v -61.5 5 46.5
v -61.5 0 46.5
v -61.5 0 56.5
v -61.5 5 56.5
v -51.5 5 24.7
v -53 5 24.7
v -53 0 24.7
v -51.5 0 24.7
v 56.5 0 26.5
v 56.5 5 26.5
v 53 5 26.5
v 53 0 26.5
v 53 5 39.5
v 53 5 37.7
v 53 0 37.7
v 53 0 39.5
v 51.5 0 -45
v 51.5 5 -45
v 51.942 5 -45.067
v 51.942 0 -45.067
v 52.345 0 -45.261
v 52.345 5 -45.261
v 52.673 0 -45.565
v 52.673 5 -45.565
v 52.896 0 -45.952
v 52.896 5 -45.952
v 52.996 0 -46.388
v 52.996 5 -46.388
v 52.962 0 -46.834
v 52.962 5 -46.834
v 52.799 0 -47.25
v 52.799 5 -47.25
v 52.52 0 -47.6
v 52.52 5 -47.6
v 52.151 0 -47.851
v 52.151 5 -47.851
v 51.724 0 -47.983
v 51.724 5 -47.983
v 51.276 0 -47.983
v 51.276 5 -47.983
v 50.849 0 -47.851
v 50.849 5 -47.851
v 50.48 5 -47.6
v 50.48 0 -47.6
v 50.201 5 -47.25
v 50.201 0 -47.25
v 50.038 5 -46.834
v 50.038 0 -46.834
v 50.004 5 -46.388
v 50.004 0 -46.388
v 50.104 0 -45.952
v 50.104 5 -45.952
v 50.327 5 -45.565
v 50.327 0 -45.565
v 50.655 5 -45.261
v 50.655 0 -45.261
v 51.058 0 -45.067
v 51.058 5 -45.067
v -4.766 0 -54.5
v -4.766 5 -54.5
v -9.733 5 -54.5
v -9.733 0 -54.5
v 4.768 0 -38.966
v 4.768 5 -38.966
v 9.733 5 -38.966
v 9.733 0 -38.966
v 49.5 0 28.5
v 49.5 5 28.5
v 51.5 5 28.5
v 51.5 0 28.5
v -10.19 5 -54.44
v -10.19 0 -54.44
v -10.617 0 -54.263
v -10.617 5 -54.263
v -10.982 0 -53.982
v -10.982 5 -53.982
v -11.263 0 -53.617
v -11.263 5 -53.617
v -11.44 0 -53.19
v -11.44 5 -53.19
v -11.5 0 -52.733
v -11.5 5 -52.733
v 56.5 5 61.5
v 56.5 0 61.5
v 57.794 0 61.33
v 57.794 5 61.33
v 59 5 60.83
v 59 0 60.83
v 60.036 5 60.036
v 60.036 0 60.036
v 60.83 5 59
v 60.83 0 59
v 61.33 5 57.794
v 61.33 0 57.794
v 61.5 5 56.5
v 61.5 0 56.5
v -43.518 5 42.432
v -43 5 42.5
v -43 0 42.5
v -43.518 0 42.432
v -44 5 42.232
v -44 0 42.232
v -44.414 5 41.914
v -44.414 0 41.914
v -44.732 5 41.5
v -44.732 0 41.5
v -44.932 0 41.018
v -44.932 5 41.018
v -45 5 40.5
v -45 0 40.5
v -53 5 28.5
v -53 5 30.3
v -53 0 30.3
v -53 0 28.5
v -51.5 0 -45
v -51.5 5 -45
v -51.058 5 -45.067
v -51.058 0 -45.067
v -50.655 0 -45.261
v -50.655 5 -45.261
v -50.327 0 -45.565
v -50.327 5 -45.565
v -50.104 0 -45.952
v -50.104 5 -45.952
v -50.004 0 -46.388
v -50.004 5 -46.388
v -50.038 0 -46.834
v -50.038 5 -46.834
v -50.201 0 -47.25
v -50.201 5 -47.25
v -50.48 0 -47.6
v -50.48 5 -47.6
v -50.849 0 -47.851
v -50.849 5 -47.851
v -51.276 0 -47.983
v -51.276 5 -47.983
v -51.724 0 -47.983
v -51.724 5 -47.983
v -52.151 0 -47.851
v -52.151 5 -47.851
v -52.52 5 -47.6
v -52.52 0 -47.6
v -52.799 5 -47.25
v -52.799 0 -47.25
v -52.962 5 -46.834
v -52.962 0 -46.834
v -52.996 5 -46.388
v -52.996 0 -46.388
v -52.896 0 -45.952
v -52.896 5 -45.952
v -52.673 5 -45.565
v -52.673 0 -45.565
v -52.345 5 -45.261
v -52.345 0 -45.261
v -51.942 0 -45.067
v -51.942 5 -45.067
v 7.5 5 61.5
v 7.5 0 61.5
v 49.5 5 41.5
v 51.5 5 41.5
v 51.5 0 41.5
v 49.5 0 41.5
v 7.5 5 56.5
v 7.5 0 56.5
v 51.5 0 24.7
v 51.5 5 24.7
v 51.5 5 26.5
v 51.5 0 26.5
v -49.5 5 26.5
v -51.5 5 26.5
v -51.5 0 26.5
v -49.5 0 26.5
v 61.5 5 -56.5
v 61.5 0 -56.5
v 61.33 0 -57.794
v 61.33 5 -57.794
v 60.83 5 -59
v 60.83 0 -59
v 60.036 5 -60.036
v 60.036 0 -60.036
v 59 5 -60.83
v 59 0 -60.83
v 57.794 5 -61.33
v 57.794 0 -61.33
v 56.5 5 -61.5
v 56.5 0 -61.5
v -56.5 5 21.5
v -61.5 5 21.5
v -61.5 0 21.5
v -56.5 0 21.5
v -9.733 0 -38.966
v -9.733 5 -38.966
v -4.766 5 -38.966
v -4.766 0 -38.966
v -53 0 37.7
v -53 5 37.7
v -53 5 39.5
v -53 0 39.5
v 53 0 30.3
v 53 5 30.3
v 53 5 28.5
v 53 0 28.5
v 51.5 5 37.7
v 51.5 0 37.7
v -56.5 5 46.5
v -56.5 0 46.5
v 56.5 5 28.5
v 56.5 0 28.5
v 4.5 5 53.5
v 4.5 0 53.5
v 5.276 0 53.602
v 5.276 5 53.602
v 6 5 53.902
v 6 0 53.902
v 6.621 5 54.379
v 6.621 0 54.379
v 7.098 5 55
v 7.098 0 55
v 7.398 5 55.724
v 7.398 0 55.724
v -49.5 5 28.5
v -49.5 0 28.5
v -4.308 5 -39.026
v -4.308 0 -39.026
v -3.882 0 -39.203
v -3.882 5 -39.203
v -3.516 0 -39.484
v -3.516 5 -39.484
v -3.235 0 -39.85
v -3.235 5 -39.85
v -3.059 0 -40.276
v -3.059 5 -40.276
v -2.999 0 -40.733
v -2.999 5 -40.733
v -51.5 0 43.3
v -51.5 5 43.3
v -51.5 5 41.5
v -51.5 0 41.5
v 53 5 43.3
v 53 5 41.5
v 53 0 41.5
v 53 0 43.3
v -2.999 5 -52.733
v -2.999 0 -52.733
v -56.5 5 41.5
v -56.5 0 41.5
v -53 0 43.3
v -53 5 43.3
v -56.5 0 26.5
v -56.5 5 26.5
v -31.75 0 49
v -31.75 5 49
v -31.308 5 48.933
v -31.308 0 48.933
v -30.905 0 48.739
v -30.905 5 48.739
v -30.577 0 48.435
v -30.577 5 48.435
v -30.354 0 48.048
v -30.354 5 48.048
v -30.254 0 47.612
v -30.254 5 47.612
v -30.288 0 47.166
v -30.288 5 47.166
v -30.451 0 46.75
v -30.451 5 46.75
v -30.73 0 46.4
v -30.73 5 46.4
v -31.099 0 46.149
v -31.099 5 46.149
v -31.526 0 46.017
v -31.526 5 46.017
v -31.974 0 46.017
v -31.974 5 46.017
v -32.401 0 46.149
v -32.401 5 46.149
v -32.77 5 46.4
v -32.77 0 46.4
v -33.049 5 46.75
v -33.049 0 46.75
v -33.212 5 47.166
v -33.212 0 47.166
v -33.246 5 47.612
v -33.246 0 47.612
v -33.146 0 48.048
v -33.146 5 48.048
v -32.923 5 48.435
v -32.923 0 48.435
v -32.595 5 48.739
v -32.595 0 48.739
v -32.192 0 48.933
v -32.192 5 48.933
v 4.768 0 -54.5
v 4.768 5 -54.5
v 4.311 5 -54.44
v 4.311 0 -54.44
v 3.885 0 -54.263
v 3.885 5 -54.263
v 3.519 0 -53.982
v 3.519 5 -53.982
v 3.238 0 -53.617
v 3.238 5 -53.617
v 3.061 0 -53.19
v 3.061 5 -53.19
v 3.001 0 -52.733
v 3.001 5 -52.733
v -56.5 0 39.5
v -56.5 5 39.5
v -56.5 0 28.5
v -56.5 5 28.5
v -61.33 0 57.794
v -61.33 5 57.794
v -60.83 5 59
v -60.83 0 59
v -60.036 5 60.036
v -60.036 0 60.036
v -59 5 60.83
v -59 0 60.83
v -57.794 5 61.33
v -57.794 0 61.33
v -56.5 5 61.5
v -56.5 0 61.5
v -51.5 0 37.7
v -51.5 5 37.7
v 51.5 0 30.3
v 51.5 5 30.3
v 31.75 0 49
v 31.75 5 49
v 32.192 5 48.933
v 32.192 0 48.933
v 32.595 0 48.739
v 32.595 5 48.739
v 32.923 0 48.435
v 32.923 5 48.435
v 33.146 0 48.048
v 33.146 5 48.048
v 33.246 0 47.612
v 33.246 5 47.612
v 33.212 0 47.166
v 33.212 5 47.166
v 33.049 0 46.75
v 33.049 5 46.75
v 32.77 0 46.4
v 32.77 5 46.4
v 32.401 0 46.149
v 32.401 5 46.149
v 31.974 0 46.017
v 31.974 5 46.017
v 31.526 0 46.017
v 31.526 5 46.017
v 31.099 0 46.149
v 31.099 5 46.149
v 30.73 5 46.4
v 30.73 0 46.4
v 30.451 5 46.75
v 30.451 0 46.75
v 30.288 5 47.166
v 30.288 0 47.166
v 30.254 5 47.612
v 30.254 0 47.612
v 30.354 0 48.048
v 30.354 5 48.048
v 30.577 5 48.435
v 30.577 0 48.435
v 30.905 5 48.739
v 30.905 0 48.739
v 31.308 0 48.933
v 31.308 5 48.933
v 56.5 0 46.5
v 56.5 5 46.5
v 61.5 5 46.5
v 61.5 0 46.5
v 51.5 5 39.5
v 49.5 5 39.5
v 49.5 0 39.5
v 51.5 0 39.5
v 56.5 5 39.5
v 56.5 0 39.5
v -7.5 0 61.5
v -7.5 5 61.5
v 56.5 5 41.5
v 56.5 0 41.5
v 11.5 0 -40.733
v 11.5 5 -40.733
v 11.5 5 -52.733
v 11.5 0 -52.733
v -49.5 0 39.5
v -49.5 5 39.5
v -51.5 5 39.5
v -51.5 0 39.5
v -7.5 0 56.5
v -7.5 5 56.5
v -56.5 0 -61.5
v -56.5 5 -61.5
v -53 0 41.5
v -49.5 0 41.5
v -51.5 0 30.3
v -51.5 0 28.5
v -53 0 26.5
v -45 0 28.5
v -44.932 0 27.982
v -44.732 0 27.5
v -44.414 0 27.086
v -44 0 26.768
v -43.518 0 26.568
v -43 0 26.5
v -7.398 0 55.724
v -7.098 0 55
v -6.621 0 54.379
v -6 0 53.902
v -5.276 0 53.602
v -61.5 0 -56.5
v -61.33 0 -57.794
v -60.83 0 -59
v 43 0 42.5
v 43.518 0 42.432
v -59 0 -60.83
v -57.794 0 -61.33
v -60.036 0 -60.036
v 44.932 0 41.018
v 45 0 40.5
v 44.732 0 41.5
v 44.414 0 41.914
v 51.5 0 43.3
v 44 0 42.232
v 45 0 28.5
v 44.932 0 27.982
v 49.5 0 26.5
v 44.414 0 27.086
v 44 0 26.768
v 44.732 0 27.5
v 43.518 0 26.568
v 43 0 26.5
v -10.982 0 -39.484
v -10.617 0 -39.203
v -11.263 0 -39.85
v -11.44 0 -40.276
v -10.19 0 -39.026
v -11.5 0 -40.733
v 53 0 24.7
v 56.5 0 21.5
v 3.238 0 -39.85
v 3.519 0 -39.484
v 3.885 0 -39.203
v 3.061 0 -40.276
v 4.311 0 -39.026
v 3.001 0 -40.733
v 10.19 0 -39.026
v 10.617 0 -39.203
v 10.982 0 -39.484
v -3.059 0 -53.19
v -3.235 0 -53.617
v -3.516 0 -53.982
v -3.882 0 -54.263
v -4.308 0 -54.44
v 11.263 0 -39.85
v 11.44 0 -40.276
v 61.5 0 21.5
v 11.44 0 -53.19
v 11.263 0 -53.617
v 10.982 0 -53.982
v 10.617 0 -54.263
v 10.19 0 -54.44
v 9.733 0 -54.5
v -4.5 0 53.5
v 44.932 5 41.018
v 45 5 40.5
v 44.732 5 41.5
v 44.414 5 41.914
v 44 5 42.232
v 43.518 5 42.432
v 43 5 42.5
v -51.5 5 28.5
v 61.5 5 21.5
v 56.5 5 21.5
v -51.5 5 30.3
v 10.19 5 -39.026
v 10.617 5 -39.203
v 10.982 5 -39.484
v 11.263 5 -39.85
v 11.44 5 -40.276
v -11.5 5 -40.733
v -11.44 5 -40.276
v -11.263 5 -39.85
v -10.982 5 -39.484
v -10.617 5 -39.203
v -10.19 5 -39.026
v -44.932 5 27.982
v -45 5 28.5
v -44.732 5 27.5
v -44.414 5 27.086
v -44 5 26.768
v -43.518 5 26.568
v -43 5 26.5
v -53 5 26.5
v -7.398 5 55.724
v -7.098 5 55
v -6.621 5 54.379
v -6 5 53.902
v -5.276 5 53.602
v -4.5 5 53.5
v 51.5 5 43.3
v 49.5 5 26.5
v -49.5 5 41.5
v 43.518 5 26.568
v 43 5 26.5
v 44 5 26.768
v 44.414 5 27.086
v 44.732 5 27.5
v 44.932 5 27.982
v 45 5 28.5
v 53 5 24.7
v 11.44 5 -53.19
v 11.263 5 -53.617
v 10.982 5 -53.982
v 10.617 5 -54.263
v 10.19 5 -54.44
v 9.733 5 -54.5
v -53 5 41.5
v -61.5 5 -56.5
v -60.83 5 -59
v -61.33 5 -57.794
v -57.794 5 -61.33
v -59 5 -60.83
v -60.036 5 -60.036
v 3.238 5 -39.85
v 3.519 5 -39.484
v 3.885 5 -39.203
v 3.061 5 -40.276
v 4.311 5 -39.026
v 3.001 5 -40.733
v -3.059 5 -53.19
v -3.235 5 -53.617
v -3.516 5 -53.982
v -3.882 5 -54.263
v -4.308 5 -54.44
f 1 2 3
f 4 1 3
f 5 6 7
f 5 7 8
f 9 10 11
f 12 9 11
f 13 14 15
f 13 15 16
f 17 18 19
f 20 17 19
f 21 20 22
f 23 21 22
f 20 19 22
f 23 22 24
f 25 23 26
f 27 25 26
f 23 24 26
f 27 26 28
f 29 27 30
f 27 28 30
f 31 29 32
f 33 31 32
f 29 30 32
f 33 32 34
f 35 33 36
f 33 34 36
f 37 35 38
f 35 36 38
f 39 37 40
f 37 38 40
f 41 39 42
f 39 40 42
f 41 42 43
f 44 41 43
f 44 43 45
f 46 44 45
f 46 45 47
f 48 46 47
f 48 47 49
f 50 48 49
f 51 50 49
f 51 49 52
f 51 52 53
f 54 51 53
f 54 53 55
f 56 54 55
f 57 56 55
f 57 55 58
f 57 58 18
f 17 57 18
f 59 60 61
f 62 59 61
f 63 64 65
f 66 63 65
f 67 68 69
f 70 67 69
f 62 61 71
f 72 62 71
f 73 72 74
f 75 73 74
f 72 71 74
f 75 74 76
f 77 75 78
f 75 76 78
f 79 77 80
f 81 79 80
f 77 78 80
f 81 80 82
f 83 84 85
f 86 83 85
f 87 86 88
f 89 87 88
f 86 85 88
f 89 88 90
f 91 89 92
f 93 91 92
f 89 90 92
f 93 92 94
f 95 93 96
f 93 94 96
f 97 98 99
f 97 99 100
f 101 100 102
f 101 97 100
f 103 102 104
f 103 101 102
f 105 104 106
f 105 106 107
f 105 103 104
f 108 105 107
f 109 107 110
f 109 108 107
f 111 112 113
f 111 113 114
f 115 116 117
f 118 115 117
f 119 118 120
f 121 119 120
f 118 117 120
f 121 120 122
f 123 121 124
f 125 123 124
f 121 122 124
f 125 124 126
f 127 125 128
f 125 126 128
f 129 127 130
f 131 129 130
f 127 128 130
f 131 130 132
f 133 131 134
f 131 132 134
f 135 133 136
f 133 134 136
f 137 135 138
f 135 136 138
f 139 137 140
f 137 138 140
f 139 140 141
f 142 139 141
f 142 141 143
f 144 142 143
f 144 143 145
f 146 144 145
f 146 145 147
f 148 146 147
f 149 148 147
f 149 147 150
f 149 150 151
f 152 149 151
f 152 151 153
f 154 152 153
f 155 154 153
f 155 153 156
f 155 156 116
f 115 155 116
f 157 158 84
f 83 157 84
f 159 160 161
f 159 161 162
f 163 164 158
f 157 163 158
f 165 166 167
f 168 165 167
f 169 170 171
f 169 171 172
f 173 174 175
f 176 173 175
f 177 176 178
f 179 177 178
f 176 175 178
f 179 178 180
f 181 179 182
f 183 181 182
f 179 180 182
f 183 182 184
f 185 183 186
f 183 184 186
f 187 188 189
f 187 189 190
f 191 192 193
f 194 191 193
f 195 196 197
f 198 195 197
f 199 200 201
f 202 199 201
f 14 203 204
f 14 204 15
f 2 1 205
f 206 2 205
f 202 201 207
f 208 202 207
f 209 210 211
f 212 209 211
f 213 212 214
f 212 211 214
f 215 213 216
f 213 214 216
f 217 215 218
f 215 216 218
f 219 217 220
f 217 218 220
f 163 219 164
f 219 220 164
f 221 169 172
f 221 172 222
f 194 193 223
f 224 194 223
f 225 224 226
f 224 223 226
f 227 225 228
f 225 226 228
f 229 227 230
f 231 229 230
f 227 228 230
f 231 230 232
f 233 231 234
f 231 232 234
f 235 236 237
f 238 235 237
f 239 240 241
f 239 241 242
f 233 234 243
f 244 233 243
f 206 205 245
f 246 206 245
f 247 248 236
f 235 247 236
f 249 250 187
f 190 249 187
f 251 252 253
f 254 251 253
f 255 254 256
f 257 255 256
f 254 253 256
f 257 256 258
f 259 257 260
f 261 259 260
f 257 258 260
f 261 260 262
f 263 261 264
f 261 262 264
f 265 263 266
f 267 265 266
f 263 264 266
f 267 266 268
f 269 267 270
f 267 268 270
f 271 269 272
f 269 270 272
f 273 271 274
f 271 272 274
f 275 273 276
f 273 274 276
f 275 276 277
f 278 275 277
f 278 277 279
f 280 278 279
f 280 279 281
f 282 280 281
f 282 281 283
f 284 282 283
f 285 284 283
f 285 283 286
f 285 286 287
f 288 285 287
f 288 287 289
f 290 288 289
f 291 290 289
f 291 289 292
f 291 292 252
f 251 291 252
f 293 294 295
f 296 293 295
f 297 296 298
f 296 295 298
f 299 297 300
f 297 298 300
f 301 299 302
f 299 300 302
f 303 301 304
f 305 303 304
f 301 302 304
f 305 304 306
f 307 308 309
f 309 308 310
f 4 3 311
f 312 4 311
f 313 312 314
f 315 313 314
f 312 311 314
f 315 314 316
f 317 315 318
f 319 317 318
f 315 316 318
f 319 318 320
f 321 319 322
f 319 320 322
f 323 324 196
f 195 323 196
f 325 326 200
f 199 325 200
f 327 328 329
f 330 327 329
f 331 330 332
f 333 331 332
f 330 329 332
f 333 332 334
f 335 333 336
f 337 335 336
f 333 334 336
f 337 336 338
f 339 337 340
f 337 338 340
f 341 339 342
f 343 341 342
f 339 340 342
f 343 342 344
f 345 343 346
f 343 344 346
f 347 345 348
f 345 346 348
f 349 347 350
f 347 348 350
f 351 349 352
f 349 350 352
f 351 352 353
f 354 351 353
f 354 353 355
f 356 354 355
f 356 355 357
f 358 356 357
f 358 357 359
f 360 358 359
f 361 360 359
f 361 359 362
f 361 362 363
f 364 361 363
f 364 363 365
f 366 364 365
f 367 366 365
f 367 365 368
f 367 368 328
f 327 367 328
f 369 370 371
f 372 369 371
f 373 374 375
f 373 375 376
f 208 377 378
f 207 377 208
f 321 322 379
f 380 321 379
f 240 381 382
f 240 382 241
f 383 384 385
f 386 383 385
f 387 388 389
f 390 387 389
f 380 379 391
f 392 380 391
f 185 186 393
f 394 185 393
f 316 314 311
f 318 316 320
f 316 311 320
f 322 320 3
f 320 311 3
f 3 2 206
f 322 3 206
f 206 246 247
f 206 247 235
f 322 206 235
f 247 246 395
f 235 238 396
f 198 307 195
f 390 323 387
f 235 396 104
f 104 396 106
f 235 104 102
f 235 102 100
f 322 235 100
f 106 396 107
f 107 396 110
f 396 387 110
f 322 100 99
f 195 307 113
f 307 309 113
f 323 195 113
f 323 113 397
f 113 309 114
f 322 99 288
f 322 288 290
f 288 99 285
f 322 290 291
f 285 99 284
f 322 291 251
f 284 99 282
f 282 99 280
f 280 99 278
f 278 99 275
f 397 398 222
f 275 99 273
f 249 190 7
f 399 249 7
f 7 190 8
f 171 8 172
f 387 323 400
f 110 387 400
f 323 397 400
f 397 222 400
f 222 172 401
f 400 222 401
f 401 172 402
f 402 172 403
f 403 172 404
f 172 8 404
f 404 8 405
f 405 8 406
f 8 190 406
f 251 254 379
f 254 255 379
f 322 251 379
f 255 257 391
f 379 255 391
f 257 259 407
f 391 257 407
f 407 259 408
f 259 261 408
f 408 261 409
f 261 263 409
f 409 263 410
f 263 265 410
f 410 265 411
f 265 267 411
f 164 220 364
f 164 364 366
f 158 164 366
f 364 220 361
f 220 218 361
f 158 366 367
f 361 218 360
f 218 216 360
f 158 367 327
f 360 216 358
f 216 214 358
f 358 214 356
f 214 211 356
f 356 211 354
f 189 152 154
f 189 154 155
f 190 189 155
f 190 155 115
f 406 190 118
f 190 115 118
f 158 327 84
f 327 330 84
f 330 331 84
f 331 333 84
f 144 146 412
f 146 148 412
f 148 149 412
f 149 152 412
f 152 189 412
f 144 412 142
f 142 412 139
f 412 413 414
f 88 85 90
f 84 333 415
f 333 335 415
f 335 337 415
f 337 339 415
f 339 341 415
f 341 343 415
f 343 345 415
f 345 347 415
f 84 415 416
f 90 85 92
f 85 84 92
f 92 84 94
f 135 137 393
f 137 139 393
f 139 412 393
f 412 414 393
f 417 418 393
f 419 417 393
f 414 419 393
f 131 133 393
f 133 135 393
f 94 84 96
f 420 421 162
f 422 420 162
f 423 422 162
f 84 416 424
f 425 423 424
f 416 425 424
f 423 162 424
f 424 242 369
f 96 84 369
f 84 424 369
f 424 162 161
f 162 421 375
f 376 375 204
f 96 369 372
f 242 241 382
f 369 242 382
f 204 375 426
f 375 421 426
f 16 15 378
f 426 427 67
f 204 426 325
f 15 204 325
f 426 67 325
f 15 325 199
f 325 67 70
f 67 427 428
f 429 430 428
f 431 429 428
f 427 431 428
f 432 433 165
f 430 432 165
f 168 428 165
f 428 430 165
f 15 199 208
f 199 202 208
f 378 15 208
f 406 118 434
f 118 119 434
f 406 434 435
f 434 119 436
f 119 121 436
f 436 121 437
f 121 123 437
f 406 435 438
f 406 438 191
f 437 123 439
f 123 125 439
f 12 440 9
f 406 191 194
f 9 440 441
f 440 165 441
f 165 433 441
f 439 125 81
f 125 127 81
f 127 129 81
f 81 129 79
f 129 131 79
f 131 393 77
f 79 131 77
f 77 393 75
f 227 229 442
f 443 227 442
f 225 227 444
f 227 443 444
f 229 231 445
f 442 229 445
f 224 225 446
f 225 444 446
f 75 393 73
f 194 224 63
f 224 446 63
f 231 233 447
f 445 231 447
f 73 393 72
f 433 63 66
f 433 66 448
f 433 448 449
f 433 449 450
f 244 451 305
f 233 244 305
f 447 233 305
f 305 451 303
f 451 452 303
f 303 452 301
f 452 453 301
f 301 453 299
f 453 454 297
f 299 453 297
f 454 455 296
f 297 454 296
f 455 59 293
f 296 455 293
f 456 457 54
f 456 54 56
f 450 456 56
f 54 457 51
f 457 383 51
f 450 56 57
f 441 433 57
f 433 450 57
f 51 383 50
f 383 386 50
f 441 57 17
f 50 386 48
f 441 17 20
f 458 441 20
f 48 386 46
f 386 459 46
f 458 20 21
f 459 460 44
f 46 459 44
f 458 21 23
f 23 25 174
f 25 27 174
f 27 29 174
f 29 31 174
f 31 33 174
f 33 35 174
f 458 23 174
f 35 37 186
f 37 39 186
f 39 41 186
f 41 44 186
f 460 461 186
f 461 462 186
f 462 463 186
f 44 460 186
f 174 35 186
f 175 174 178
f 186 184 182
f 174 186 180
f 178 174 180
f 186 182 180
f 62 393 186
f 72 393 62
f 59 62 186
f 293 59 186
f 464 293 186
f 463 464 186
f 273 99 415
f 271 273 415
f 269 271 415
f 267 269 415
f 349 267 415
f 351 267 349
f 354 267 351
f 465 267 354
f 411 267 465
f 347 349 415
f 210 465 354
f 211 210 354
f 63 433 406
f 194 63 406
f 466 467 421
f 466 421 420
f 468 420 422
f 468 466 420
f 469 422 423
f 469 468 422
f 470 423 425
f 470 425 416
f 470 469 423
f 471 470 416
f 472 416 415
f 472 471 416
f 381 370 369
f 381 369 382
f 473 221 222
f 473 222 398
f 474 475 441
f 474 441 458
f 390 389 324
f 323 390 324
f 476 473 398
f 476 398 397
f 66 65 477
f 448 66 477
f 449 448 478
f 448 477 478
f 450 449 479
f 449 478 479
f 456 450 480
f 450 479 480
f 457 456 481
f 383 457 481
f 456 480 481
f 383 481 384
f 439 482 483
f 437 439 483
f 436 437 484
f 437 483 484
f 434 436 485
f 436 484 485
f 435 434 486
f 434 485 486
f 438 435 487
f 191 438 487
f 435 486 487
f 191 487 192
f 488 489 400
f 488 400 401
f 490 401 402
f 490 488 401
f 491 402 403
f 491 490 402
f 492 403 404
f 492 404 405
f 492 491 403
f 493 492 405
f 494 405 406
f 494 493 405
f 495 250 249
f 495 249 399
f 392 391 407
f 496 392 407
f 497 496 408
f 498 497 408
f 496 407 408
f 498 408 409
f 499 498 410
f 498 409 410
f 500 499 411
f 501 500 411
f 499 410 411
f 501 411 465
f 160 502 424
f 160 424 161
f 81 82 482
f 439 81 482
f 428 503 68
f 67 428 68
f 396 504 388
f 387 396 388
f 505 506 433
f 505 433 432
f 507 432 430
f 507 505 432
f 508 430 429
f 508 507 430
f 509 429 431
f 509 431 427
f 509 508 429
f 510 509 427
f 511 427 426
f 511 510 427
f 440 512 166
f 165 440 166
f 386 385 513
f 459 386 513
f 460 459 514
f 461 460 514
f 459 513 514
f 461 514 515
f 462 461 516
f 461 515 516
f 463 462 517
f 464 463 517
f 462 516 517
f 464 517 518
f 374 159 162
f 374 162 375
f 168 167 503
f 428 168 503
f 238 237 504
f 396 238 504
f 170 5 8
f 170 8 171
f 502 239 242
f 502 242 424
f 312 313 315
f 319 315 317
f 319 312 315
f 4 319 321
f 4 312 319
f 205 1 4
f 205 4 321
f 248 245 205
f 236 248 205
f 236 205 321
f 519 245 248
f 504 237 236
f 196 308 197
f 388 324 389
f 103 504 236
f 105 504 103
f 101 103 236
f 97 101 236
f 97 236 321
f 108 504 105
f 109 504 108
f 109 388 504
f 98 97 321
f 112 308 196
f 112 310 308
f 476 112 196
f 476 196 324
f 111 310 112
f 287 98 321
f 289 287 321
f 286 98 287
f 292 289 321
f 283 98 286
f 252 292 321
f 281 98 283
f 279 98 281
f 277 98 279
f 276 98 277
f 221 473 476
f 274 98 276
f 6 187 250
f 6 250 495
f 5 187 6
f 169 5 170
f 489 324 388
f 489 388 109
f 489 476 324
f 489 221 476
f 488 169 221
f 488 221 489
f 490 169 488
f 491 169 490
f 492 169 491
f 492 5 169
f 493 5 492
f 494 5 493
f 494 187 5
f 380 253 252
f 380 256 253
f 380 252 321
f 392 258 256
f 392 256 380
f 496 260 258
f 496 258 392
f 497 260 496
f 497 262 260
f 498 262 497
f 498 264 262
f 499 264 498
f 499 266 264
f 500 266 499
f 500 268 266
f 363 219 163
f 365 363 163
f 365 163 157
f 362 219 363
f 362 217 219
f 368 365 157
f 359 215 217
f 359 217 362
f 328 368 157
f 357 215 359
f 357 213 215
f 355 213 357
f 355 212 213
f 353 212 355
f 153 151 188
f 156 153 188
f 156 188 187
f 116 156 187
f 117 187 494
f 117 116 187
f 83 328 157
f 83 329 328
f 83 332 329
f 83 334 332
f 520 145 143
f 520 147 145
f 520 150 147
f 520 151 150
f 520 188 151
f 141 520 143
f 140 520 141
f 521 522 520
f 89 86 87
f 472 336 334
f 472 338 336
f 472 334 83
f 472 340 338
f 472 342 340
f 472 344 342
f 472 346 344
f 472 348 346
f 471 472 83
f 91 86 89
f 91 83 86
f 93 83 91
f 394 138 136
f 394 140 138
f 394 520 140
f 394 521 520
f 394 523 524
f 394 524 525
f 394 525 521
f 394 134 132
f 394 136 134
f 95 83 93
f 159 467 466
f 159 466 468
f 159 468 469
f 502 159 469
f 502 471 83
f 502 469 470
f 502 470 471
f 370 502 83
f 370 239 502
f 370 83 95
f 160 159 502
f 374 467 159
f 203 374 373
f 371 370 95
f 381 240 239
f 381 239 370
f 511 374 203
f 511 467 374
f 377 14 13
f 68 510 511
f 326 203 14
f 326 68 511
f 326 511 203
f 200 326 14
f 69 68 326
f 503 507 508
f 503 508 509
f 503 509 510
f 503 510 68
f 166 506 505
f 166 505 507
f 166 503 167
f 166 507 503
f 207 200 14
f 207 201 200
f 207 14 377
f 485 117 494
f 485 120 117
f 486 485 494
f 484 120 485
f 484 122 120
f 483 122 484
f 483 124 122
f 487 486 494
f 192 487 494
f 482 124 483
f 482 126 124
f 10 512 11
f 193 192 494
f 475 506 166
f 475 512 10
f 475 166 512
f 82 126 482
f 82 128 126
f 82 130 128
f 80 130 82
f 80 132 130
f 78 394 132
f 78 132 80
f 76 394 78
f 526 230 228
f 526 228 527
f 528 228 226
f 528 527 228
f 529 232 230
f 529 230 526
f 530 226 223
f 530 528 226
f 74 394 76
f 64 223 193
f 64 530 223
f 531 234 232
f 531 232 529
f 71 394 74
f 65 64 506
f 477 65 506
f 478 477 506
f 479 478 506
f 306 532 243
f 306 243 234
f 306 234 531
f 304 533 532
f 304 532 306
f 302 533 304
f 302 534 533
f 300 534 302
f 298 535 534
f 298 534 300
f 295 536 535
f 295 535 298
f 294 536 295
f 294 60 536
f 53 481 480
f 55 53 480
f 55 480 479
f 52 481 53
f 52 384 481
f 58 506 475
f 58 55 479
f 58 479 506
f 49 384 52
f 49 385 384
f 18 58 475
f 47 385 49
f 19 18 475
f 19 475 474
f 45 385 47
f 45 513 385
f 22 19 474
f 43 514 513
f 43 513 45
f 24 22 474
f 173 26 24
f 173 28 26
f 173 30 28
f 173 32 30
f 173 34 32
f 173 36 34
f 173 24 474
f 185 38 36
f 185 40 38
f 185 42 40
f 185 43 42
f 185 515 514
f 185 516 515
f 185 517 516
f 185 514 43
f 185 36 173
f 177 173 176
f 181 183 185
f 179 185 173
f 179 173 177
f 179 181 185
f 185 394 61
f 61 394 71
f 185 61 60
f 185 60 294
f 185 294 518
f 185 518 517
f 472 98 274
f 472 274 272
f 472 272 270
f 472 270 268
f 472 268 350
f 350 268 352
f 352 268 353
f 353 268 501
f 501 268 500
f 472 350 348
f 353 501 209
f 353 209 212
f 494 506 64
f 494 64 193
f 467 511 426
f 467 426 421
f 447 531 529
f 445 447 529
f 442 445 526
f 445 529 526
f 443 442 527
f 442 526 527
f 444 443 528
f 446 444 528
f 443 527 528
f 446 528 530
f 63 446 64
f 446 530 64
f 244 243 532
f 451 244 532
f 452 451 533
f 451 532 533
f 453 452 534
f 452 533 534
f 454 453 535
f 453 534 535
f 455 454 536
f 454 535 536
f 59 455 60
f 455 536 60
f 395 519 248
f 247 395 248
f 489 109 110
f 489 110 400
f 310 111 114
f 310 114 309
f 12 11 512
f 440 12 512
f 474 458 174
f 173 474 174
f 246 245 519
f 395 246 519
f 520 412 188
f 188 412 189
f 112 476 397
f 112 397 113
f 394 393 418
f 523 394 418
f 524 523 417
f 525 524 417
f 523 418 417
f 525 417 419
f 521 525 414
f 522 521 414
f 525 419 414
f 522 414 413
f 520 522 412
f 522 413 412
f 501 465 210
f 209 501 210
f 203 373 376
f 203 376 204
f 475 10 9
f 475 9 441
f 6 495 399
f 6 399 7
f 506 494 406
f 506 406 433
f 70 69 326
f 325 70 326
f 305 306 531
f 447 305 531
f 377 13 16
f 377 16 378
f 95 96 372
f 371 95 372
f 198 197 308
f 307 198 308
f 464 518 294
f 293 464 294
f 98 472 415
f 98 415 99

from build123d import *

# Parameters (mm, degrees)
RESSALTO_EXTRUS_O1_DEPTH = 5
CORTE_EXTRUS_O1_DEPTH    = 5
ESBO_O3_W                = 5
ESBO_O3_H                = 25
CORTE_EXTRUS_O3_DEPTH    = 5
CORTE_EXTRUS_O4_DEPTH    = 10
CORTE_EXTRUS_O5_DEPTH    = 5
ESBO_O6_R                = 1.5
CORTE_EXTRUS_O6_DEPTH    = 20
CORTE_EXTRUS_O7_DEPTH    = 10


with BuildPart() as part:
    # Esboço1 → Ressalto-extrusão1 (new body)
    with BuildSketch(Plane(origin=(0, 0, 0), x_dir=(1, 0, 0), z_dir=(0, 1, 0))):
        with BuildLine():
            Line((-56.5, -61.5), (56.5, -61.5))
            ThreePointArc((56.5, -61.5), (60.035533906, -60.035533906), (61.5, -56.5))
            Line((61.5, -56.5), (61.5, 56.5))
            ThreePointArc((61.5, 56.5), (60.035533906, 60.035533906), (56.5, 61.5))
            Line((56.5, 61.5), (-56.5, 61.5))
            ThreePointArc((-56.5, 61.5), (-60.035533906, 60.035533906), (-61.5, 56.5))
            Line((-61.5, 56.5), (-61.5, -56.5))
            ThreePointArc((-61.5, -56.5), (-60.035533906, -60.035533906), (-56.5, -61.5))
        make_face()
    extrude(amount=RESSALTO_EXTRUS_O1_DEPTH)

    # Esboço2 → Corte-extrusão1 (cut)
    with BuildSketch(Plane(origin=(0, 5, 0), x_dir=(1, 0, 0), z_dir=(0, 1, 0))):
        with BuildLine():
            Line((-4.765646957, 54.5), (-9.733117681, 54.5))
            ThreePointArc((-9.733117681, 54.5), (-10.98249215, 53.98249215), (-11.5, 52.733117681))
            Line((-11.5, 52.733117681), (-11.5, 40.733117681))
            ThreePointArc((-11.5, 40.733117681), (-10.98249215, 39.483743212), (-9.733117681, 38.966235362))
            Line((-9.733117681, 38.966235362), (-4.765646957, 38.966235362))
            ThreePointArc((-4.765646957, 38.966235362), (-3.516272487, 39.483743212), (-2.998764638, 40.733117681))
            Line((-2.998764638, 40.733117681), (-2.998764638, 52.733117681))
            ThreePointArc((-2.998764638, 52.733117681), (-3.516272487, 53.98249215), (-4.765646957, 54.5))
        make_face()
        with BuildLine():
            Line((4.768117681, 38.966235362), (9.733117681, 38.966235362))
            ThreePointArc((9.733117681, 38.966235362), (10.98249215, 39.483743212), (11.5, 40.733117681))
            Line((11.5, 40.733117681), (11.5, 52.733117681))
            ThreePointArc((11.5, 52.733117681), (10.98249215, 53.98249215), (9.733117681, 54.5))
            Line((9.733117681, 54.5), (4.768117681, 54.5))
            ThreePointArc((4.768117681, 54.5), (3.518743212, 53.98249215), (3.001235362, 52.733117681))
            Line((3.001235362, 52.733117681), (3.001235362, 40.733117681))
            ThreePointArc((3.001235362, 40.733117681), (3.518743212, 39.483743212), (4.768117681, 38.966235362))
        make_face()
    extrude(amount=-CORTE_EXTRUS_O1_DEPTH, mode=Mode.SUBTRACT)

    # Esboço3 → Corte-extrusão3 (cut)
    with BuildSketch(Plane(origin=(0, 5, 0), x_dir=(1, 0, 0), z_dir=(0, 1, 0))):
        with Locations((-59, -34)):
            Rectangle(ESBO_O3_W, ESBO_O3_H)
        with Locations((59, -34)):
            Rectangle(ESBO_O3_W, ESBO_O3_H)
    extrude(amount=-CORTE_EXTRUS_O3_DEPTH, mode=Mode.SUBTRACT)

    # Esboço4 → Corte-extrusão4 (cut)
    with BuildSketch(Plane(origin=(0, 5, 0), x_dir=(1, 0, 0), z_dir=(0, 1, 0))):
        Polygon((56.5, -41.5), (53, -41.5), (53, -43.3), (51.5, -43.3), (51.5, -41.5), (49.5, -41.5), (49.5, -39.5), (51.5, -39.5), (51.5, -37.7), (53, -37.7), (53, -39.5), (56.5, -39.5), align=None)
        Polygon((56.5, -26.5), (53, -26.5), (53, -24.7), (51.5, -24.7), (51.5, -26.5), (49.5, -26.5), (49.5, -28.5), (51.5, -28.5), (51.5, -30.3), (53, -30.3), (53, -28.5), (56.5, -28.5), align=None)
    corte_extrus_o4 = extrude(amount=-CORTE_EXTRUS_O4_DEPTH, mode=Mode.SUBTRACT)

    # Espelhar1: Corte-extrusão4 across plane
    add(corte_extrus_o4.mirror(Plane(origin=(0, 0, 0), x_dir=(0, 0, 1), z_dir=(1, 0, 0))), mode=Mode.SUBTRACT)

    # Esboço5 → Corte-extrusão5 (cut)
    with BuildSketch(Plane(origin=(0, 5, 0), x_dir=(1, 0, 0), z_dir=(0, 1, 0))):
        with BuildLine():
            Line((43, -42.5), (-43, -42.5))
            ThreePointArc((-43, -42.5), (-44.414213562, -41.914213562), (-45, -40.5))
            Line((-45, -40.5), (-45, -28.5))
            ThreePointArc((-45, -28.5), (-44.414213562, -27.085786438), (-43, -26.5))
            Line((-43, -26.5), (43, -26.5))
            ThreePointArc((43, -26.5), (44.414213562, -27.085786438), (45, -28.5))
            Line((45, -28.5), (45, -40.5))
            ThreePointArc((45, -40.5), (44.414213562, -41.914213562), (43, -42.5))
        make_face()
    extrude(amount=-CORTE_EXTRUS_O5_DEPTH, mode=Mode.SUBTRACT)

    # Esboço6 → Corte-extrusão6 (cut)
    with BuildSketch(Plane(origin=(0, 5, 0), x_dir=(1, 0, 0), z_dir=(0, 1, 0))):
        with Locations(Location((-51.5, 46.5, 0), (0, 0, 270))):
            Circle(ESBO_O6_R)
        with Locations(Location((51.5, 46.5, 0), (0, 0, 270))):
            Circle(ESBO_O6_R)
        with Locations(Location((31.75, -47.5, 0), (0, 0, 270))):
            Circle(ESBO_O6_R)
        with Locations(Location((-31.75, -47.5, 0), (0, 0, 270))):
            Circle(ESBO_O6_R)
    extrude(amount=-CORTE_EXTRUS_O6_DEPTH, mode=Mode.SUBTRACT)

    # Esboço7 → Corte-extrusão7 (cut)
    with BuildSketch(Plane.XZ):
        with BuildLine():
            Line((7.5, 61.5), (-7.5, 61.5))
            Line((-7.5, 61.5), (-7.5, 56.5))
            ThreePointArc((-7.5, 56.5), (-6.621320344, 54.378679656), (-4.5, 53.5))
            Line((-4.5, 53.5), (4.5, 53.5))
            ThreePointArc((4.5, 53.5), (6.621320344, 54.378679656), (7.5, 56.5))
            Line((7.5, 56.5), (7.5, 61.5))
        make_face()
    extrude(amount=-CORTE_EXTRUS_O7_DEPTH, mode=Mode.SUBTRACT)


solid = part.part
